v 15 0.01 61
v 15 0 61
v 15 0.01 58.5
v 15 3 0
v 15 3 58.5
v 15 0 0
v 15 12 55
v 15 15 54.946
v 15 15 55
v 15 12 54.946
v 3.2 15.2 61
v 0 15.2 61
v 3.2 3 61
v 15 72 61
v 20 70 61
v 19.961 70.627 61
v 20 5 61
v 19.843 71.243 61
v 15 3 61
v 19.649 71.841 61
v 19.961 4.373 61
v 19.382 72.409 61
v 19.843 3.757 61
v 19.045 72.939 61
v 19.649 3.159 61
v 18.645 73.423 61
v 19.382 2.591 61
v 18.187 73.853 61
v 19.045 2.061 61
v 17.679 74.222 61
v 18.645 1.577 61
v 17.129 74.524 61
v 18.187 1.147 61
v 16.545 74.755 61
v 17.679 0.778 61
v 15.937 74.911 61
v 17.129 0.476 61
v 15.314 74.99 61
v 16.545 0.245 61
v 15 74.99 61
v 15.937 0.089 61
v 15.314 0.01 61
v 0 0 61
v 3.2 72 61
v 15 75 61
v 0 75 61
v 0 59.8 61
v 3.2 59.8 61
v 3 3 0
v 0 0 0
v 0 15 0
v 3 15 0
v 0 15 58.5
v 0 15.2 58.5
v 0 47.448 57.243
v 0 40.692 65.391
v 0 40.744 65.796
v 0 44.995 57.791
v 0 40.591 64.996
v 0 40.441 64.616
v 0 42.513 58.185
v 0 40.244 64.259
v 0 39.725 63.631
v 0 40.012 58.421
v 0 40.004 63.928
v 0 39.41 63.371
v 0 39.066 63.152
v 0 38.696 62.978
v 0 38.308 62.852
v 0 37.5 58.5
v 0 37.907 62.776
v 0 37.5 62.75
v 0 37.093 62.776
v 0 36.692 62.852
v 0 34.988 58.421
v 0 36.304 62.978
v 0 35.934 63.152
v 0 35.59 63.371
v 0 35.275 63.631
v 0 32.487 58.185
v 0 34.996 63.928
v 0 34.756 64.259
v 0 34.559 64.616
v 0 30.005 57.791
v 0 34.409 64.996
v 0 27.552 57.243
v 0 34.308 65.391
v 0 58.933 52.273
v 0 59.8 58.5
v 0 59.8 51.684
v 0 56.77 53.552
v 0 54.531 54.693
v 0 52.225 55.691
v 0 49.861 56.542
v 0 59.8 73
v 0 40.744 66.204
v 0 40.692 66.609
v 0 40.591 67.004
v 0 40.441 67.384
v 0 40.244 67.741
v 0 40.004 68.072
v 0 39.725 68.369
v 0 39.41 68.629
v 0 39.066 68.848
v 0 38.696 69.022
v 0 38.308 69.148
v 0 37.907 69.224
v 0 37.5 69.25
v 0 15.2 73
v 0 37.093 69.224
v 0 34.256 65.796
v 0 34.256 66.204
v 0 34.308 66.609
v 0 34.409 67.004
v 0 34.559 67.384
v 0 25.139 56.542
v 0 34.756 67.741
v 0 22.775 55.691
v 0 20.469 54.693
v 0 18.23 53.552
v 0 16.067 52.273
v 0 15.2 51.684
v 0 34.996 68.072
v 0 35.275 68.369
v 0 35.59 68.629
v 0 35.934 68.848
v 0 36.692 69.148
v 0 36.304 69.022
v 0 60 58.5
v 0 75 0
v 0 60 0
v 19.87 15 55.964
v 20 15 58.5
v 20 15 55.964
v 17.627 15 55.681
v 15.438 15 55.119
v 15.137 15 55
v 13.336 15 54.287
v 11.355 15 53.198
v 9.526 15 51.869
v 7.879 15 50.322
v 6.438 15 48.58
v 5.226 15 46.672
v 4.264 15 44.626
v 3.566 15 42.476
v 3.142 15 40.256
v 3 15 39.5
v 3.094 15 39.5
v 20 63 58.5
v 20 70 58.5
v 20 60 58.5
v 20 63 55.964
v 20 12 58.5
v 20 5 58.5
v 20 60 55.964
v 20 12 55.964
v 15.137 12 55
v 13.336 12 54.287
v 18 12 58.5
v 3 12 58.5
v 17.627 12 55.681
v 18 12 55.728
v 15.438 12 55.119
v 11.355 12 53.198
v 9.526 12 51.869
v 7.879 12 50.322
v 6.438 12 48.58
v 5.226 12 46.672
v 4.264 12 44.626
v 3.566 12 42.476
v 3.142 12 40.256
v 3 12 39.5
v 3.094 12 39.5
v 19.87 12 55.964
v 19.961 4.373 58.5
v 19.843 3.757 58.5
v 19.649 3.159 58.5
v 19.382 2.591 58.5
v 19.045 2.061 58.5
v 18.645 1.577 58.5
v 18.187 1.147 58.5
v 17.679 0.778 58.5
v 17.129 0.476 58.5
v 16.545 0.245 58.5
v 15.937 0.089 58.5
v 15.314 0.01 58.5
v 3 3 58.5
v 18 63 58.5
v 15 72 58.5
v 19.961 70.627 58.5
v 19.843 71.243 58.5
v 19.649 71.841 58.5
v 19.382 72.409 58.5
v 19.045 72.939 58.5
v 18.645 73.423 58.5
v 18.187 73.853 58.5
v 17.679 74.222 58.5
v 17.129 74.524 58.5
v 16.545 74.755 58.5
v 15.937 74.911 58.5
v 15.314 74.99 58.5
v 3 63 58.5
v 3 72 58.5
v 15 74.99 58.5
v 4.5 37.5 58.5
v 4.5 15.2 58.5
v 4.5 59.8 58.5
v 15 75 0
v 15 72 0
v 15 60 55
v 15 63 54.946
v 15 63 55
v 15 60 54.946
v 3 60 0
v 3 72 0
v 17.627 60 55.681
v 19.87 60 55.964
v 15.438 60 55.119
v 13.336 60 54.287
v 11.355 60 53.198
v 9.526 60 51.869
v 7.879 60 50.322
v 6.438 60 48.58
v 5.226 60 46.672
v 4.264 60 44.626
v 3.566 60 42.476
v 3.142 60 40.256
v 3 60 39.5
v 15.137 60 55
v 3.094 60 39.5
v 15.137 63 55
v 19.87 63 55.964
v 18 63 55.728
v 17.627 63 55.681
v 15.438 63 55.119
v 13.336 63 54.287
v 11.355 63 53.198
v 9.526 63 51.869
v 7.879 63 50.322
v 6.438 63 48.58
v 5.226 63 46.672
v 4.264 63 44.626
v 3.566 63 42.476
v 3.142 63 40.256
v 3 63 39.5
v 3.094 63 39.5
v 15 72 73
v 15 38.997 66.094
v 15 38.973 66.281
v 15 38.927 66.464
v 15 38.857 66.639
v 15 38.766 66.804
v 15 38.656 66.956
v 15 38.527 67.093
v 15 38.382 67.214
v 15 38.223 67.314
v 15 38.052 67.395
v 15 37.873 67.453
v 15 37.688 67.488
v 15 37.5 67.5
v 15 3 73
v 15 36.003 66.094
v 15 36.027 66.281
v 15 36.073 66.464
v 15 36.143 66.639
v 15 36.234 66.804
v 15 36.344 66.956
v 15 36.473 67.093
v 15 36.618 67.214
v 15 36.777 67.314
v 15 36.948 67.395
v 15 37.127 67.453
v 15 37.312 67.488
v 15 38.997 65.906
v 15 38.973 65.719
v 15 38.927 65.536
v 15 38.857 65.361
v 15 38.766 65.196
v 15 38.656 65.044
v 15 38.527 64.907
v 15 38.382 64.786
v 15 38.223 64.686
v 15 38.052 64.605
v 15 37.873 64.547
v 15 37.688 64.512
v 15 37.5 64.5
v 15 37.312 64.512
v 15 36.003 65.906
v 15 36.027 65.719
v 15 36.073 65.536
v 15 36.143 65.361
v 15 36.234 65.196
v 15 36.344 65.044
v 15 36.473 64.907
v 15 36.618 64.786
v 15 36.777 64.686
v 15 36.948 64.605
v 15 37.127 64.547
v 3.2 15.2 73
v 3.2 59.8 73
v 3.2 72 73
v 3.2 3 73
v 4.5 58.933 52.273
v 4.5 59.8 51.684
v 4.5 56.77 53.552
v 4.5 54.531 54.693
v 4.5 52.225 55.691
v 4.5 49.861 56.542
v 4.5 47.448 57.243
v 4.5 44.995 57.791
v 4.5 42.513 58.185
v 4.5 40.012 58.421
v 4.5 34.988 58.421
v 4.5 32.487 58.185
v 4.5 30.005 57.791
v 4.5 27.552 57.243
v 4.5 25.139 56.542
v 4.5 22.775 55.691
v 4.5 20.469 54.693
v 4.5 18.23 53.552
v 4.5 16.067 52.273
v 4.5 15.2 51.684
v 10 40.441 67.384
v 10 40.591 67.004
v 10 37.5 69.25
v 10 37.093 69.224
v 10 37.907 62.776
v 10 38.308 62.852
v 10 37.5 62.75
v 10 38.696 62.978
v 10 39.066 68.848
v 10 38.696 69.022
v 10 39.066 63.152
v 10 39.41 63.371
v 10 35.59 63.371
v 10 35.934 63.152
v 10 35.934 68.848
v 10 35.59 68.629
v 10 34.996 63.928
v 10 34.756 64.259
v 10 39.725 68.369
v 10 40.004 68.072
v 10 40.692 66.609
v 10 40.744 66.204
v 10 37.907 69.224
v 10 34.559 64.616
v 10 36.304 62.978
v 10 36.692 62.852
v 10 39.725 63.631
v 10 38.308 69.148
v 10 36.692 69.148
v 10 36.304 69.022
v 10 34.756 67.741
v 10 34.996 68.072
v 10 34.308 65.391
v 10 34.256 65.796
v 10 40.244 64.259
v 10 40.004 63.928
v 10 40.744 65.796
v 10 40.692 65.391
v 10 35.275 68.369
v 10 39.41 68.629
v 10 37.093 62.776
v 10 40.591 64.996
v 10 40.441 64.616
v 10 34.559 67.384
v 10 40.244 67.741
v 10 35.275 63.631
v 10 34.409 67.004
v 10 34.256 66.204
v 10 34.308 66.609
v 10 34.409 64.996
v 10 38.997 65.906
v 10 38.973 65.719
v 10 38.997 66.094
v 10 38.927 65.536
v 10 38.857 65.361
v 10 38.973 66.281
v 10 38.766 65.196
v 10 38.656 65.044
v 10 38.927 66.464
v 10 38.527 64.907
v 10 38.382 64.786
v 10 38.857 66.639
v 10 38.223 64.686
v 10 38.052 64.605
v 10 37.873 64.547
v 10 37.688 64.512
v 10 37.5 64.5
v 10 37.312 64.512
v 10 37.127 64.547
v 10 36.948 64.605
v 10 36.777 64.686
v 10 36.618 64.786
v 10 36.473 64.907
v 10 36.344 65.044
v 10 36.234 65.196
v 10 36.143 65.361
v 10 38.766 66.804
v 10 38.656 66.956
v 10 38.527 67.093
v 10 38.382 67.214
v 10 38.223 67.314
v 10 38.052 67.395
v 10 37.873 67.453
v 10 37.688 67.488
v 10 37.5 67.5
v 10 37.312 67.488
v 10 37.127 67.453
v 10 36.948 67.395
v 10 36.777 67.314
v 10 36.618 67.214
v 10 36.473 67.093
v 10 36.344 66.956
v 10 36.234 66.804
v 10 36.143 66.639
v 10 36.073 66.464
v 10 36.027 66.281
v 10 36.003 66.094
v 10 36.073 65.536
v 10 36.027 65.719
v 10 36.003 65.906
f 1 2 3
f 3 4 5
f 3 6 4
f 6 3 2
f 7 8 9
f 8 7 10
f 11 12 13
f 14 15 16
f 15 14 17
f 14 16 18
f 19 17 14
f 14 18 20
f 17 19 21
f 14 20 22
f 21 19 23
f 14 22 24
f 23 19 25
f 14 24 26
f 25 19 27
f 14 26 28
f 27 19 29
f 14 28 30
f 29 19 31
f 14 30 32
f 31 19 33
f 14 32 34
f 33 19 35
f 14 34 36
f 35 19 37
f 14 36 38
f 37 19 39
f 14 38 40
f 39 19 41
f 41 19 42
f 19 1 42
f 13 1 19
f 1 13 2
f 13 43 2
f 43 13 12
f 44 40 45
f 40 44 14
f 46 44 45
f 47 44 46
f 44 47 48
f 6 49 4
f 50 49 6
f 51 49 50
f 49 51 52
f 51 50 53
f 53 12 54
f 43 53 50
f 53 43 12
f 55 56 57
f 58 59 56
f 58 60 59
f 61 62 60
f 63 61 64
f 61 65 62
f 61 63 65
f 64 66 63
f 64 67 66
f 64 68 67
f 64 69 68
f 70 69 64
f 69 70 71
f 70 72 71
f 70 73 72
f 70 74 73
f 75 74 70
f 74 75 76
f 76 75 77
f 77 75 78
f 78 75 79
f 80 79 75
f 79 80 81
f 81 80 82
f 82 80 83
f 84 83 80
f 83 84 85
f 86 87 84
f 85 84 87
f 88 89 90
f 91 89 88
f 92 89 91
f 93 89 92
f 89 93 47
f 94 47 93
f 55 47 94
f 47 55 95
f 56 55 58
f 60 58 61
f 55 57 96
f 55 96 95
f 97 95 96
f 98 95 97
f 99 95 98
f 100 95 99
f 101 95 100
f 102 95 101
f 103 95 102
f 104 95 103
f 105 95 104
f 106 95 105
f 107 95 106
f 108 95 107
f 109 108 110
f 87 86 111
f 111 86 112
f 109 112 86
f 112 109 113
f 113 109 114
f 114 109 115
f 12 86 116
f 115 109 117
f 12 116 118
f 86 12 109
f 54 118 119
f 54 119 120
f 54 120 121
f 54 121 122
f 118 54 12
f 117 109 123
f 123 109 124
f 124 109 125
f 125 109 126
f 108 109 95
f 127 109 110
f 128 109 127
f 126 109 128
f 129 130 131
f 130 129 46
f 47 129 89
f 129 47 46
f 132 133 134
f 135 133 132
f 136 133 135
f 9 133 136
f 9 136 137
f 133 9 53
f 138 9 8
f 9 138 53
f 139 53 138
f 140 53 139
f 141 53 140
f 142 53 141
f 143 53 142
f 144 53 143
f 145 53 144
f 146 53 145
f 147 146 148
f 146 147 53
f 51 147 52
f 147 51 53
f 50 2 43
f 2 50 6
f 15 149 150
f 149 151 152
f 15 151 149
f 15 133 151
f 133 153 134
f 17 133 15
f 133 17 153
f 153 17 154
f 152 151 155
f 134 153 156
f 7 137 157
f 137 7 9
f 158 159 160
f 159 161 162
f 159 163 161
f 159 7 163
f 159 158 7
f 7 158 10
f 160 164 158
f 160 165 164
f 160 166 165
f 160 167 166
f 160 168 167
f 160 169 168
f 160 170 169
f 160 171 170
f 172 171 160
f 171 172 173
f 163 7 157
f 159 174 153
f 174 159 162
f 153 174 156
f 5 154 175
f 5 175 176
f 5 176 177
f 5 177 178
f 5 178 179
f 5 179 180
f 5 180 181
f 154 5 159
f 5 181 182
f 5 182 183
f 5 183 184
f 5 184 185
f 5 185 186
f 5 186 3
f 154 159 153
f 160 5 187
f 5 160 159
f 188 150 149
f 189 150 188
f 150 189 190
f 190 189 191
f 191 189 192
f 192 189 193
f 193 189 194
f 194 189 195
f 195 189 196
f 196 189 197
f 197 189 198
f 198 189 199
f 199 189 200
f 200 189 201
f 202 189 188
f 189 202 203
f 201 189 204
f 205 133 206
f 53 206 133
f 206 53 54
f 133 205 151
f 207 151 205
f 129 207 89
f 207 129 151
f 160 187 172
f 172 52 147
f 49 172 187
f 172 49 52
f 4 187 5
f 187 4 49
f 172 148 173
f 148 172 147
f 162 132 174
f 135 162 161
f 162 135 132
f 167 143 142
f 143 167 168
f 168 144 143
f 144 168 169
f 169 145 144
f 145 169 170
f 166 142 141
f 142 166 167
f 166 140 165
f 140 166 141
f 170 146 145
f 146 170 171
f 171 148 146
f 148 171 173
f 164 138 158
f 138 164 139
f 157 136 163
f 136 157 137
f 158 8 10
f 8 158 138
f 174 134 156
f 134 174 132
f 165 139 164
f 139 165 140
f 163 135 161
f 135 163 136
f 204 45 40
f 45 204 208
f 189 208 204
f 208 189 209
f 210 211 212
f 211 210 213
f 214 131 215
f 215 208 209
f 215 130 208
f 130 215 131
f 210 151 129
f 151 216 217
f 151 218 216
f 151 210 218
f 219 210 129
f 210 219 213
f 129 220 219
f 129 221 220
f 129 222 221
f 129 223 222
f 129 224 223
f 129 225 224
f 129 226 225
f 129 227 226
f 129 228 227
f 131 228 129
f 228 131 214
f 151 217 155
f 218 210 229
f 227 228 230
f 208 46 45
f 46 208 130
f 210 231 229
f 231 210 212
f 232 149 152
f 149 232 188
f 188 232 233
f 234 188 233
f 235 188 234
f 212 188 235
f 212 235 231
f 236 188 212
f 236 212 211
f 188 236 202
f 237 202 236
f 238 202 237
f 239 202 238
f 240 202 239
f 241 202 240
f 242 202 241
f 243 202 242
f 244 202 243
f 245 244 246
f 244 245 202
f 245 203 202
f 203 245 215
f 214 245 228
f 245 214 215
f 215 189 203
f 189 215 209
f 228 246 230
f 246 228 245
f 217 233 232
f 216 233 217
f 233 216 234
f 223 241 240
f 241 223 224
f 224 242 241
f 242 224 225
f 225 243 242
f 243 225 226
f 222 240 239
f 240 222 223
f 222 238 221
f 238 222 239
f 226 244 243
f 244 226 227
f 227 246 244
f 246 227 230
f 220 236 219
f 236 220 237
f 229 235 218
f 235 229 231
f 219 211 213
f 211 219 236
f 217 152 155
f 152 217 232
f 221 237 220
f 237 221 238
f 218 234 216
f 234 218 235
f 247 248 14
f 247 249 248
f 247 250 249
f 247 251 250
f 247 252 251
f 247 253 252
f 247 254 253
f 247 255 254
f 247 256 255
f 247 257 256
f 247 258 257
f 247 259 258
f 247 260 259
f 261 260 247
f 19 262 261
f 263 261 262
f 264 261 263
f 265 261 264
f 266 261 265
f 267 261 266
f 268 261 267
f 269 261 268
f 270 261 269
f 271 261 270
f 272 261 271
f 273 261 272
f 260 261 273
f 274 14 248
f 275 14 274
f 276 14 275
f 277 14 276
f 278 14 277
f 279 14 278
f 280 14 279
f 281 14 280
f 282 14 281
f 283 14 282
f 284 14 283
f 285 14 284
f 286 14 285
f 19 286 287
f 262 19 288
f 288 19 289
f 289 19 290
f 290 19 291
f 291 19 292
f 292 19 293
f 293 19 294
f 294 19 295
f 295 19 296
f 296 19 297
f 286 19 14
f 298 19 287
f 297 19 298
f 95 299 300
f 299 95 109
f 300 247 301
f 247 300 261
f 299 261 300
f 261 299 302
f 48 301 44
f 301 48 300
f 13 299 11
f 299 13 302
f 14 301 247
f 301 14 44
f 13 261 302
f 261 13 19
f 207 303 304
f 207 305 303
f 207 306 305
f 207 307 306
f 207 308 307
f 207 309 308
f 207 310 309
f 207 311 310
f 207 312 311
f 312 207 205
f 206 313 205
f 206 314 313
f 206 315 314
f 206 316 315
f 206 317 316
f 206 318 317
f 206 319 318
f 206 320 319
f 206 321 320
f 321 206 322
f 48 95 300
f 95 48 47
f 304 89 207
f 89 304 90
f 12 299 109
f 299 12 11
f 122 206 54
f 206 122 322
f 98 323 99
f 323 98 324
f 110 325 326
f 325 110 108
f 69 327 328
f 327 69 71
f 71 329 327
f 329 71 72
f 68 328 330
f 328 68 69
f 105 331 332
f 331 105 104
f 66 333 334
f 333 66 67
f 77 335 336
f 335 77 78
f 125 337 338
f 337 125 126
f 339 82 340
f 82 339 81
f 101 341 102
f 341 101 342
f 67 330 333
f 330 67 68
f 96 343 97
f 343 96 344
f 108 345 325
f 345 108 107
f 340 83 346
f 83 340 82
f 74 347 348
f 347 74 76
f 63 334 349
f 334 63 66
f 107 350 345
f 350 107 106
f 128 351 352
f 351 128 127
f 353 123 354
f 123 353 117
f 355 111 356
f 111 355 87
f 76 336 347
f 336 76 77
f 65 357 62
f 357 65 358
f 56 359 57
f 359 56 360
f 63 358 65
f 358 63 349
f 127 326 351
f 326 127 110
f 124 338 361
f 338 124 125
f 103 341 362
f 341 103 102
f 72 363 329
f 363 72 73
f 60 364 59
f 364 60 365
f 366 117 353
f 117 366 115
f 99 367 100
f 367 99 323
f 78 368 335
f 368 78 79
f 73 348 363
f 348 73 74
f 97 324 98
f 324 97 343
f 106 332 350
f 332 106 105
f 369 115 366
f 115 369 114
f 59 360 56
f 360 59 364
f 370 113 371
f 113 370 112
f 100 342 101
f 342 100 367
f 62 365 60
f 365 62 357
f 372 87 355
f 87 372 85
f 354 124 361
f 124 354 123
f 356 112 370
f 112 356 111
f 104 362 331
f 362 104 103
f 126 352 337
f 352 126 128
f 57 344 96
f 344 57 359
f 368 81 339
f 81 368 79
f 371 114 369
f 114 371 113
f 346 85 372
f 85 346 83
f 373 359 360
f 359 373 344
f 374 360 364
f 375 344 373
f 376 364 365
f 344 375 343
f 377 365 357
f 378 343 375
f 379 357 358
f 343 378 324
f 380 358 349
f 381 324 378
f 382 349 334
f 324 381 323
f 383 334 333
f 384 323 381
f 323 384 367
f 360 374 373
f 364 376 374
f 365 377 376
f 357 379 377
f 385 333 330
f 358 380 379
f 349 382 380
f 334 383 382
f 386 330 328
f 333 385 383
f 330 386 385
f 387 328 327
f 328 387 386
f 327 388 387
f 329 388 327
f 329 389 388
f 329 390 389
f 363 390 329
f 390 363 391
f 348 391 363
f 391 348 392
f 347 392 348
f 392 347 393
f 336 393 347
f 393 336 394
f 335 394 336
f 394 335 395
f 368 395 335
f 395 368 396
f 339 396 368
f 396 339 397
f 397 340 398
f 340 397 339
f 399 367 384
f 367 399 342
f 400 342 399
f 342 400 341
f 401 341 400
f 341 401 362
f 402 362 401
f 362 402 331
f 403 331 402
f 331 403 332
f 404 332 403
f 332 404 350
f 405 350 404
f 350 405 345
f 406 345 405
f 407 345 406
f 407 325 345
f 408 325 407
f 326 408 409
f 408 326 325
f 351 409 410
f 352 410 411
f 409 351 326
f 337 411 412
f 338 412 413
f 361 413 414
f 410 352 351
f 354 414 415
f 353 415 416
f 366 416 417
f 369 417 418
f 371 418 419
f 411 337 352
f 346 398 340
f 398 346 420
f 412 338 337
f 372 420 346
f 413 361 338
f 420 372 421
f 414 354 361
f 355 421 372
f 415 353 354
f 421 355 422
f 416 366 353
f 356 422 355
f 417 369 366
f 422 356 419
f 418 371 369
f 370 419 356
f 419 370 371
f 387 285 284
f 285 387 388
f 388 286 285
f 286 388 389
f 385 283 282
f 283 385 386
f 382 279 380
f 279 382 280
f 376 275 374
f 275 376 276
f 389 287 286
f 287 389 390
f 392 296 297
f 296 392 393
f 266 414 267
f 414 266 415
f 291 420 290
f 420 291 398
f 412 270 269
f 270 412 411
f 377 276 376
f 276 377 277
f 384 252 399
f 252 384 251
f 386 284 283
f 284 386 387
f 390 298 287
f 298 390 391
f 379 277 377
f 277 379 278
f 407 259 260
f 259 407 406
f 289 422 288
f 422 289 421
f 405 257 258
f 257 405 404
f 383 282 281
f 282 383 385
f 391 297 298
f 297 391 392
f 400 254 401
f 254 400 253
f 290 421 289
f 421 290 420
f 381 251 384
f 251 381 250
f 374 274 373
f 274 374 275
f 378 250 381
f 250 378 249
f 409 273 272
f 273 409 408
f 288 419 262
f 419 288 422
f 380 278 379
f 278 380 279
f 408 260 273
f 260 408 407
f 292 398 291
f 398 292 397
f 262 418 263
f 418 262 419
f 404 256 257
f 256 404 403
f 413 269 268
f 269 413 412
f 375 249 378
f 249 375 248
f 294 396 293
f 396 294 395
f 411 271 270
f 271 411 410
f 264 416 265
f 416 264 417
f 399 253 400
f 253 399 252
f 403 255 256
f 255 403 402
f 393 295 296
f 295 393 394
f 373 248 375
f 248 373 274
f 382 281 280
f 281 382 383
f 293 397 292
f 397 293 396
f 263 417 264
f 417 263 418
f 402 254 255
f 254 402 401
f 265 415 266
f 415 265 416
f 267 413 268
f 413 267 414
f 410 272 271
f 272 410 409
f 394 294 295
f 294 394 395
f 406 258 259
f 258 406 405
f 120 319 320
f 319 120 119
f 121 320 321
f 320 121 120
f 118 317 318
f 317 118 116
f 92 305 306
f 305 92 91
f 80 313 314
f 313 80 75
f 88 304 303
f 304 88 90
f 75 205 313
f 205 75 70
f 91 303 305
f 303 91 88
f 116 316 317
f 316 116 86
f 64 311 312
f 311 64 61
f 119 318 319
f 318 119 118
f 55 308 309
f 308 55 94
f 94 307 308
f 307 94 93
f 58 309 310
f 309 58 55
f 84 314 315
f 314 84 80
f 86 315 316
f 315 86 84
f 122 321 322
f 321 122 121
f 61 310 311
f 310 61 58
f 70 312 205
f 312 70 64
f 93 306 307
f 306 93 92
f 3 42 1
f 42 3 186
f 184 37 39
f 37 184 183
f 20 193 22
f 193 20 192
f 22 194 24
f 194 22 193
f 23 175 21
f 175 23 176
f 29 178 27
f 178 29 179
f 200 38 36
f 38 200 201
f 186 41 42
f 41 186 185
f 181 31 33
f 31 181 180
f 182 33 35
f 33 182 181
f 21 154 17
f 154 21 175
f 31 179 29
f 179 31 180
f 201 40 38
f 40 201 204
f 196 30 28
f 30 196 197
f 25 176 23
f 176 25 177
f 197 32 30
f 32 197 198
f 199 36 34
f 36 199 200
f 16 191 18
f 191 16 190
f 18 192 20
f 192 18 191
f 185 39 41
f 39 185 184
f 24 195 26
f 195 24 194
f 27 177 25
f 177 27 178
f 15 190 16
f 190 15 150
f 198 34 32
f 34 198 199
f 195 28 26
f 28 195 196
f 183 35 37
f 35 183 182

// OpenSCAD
module stl() {
    intersection() {
        import(file="One-Piece_Brio_Stacker_Track.stl", convexity = 10);
        //translate([0, -80]) cube([100,100,10]); //bottom_slice
        //translate([0,-8,0]) cube([100, 4, 100]); // side;
    }
    
    translate([1.5, -3, -1]) color("red") cube([75,15,2.5]);
}

leg_span = 75;
leg_w = 15;
leg_h = 61;
leg_wall_thk = 3;
leg_top_thk  = 2.5;
leg_arch_r = 18;
cantilever_w = 5;
cantilever_h = 6;

track_w = 40;
track_h = 12;

module trackPiece(l=50, w=track_w, h=track_h) {
    //l=50;
    rail_depth=3;
    rail_w=5.6;
    rail_gap=19.1;
    
    connector_l = 17.5;
    connector_w = 6.5;
    connector_d = 11.5;
    
    module connector(male=true) {
        w  = male ? connector_w : connector_w + 1.25;
        d  = male ? connector_d : connector_d + 1.25;
        hh = male ? h : h+2;
        z  = male ? 0 : -1;
        translate([z,-w/2, z]) cube([connector_l-d/2-z, w, hh]);
        translate([connector_l-d/2,0, z])cylinder(d=d, h=hh, $fn=25);
    }
    
    difference() {
        union() {
            translate([0, -w/2]) cube([l, w,h]);
            translate([l,0]) connector();
        }
        
        for(yy=[-rail_gap/2-rail_w, rail_gap/2]) {
            translate([-1, yy, h-rail_depth]) cube([l+2, rail_w, rail_depth+1]);
        }
        connector(male=false);
    }
}

module leg() {
    $fn=50;
    w       = leg_w;
    h       = leg_h;
    thk     = leg_wall_thk;
    top_thk = leg_top_thk;
    
    difference() {  //Leg vertical
        union() {
            cube([w,w,h]);
            translate([w, w-thk, h-cantilever_h]) 
                cube([cantilever_w,thk,cantilever_h]);
        }
        translate([thk, thk, -1]) {
            cube([w, w-thk*2, h-top_thk+1]);
            cube([w, w, h-top_thk-leg_arch_r]);
        }
        translate([leg_arch_r+thk, thk+1, h-leg_arch_r-cantilever_h+1]) 
            rotate([-90, 0, 0]) cylinder(r=leg_arch_r, h=w);
    }
}

module screw_hole(h1=10, h2=10) {
    $fn=50;
    head_d = 6.5;
    thread_d = 3;
 
    cylinder(d=head_d, h1);
    translate([0,0,h1-1]) cylinder(d=thread_d, h2+1);
}

module support(minimal_cantilever=false, screw_hole=true, legs=true) {
    side_drop = 12;
    side_arch_r = 40;
    side_arch_w = 1.5*leg_wall_thk;
    
    $fn=50;
    if (legs) {
        leg();
        translate([0,leg_span]) mirror([0,1,0]) leg();
    }
    
    corner_r = 5;
    translate([0,0,leg_h-leg_top_thk]) difference() { // Cantilever
        hull() {
            for(yy=[corner_r, leg_span-corner_r]) {
                translate([0, yy-corner_r]) cube([2,2*corner_r,leg_top_thk]);
                translate([leg_w+cantilever_w-corner_r,yy]) 
                    cylinder(r=corner_r,h=leg_top_thk);
            }
        }
        if (minimal_cantilever) {
            translate([side_arch_w, leg_w, -1])
                cube([leg_w+cantilever_w-side_arch_w+1,
                      leg_span-2*leg_w, leg_top_thk+2]);
        }
    }
    
    difference() {
        tol=0.2;
        union() {
            translate([leg_wall_thk+tol, leg_wall_thk, leg_h]) // Top block
                cube([leg_w-(leg_wall_thk+tol), leg_span-2*leg_wall_thk, track_h]);
        
            translate([0, leg_w+tol, leg_h-side_drop]) //Side Block
                cube([side_arch_w, leg_span-2*(leg_w+tol), side_drop+track_h]);
        }
        translate([-1,leg_span/2, leg_h-leg_top_thk-side_arch_r]) rotate([0,90])
            cylinder(r=side_arch_r, h=side_arch_w+2, $fn=100);  //Side arch
        if (screw_hole) {
            translate([-1,leg_span/2, leg_h+track_h/2-1]) 
                rotate([0,90,0]) screw_hole(h1=11);
        }
    }
    
}

//translate([12,-100]) rotate([0,0,90]) stl();

module onePiece45() {
    w=45;
    color("green") {
        support(true, screw_hole=false);
        translate([w+2*leg_w,0,0]) mirror([1,0,0])support(true, screw_hole=false);
        translate([w/2+leg_w,12,leg_h]) rotate([0,0,90]) trackPiece(w=w);
    }
}

color("green") support();
//%translate([track_w/2+leg_w,12,leg_h]) rotate([0,0,90]) trackPiece();
//onePiece45();

//color("red") cube([15,75,2.5]);
